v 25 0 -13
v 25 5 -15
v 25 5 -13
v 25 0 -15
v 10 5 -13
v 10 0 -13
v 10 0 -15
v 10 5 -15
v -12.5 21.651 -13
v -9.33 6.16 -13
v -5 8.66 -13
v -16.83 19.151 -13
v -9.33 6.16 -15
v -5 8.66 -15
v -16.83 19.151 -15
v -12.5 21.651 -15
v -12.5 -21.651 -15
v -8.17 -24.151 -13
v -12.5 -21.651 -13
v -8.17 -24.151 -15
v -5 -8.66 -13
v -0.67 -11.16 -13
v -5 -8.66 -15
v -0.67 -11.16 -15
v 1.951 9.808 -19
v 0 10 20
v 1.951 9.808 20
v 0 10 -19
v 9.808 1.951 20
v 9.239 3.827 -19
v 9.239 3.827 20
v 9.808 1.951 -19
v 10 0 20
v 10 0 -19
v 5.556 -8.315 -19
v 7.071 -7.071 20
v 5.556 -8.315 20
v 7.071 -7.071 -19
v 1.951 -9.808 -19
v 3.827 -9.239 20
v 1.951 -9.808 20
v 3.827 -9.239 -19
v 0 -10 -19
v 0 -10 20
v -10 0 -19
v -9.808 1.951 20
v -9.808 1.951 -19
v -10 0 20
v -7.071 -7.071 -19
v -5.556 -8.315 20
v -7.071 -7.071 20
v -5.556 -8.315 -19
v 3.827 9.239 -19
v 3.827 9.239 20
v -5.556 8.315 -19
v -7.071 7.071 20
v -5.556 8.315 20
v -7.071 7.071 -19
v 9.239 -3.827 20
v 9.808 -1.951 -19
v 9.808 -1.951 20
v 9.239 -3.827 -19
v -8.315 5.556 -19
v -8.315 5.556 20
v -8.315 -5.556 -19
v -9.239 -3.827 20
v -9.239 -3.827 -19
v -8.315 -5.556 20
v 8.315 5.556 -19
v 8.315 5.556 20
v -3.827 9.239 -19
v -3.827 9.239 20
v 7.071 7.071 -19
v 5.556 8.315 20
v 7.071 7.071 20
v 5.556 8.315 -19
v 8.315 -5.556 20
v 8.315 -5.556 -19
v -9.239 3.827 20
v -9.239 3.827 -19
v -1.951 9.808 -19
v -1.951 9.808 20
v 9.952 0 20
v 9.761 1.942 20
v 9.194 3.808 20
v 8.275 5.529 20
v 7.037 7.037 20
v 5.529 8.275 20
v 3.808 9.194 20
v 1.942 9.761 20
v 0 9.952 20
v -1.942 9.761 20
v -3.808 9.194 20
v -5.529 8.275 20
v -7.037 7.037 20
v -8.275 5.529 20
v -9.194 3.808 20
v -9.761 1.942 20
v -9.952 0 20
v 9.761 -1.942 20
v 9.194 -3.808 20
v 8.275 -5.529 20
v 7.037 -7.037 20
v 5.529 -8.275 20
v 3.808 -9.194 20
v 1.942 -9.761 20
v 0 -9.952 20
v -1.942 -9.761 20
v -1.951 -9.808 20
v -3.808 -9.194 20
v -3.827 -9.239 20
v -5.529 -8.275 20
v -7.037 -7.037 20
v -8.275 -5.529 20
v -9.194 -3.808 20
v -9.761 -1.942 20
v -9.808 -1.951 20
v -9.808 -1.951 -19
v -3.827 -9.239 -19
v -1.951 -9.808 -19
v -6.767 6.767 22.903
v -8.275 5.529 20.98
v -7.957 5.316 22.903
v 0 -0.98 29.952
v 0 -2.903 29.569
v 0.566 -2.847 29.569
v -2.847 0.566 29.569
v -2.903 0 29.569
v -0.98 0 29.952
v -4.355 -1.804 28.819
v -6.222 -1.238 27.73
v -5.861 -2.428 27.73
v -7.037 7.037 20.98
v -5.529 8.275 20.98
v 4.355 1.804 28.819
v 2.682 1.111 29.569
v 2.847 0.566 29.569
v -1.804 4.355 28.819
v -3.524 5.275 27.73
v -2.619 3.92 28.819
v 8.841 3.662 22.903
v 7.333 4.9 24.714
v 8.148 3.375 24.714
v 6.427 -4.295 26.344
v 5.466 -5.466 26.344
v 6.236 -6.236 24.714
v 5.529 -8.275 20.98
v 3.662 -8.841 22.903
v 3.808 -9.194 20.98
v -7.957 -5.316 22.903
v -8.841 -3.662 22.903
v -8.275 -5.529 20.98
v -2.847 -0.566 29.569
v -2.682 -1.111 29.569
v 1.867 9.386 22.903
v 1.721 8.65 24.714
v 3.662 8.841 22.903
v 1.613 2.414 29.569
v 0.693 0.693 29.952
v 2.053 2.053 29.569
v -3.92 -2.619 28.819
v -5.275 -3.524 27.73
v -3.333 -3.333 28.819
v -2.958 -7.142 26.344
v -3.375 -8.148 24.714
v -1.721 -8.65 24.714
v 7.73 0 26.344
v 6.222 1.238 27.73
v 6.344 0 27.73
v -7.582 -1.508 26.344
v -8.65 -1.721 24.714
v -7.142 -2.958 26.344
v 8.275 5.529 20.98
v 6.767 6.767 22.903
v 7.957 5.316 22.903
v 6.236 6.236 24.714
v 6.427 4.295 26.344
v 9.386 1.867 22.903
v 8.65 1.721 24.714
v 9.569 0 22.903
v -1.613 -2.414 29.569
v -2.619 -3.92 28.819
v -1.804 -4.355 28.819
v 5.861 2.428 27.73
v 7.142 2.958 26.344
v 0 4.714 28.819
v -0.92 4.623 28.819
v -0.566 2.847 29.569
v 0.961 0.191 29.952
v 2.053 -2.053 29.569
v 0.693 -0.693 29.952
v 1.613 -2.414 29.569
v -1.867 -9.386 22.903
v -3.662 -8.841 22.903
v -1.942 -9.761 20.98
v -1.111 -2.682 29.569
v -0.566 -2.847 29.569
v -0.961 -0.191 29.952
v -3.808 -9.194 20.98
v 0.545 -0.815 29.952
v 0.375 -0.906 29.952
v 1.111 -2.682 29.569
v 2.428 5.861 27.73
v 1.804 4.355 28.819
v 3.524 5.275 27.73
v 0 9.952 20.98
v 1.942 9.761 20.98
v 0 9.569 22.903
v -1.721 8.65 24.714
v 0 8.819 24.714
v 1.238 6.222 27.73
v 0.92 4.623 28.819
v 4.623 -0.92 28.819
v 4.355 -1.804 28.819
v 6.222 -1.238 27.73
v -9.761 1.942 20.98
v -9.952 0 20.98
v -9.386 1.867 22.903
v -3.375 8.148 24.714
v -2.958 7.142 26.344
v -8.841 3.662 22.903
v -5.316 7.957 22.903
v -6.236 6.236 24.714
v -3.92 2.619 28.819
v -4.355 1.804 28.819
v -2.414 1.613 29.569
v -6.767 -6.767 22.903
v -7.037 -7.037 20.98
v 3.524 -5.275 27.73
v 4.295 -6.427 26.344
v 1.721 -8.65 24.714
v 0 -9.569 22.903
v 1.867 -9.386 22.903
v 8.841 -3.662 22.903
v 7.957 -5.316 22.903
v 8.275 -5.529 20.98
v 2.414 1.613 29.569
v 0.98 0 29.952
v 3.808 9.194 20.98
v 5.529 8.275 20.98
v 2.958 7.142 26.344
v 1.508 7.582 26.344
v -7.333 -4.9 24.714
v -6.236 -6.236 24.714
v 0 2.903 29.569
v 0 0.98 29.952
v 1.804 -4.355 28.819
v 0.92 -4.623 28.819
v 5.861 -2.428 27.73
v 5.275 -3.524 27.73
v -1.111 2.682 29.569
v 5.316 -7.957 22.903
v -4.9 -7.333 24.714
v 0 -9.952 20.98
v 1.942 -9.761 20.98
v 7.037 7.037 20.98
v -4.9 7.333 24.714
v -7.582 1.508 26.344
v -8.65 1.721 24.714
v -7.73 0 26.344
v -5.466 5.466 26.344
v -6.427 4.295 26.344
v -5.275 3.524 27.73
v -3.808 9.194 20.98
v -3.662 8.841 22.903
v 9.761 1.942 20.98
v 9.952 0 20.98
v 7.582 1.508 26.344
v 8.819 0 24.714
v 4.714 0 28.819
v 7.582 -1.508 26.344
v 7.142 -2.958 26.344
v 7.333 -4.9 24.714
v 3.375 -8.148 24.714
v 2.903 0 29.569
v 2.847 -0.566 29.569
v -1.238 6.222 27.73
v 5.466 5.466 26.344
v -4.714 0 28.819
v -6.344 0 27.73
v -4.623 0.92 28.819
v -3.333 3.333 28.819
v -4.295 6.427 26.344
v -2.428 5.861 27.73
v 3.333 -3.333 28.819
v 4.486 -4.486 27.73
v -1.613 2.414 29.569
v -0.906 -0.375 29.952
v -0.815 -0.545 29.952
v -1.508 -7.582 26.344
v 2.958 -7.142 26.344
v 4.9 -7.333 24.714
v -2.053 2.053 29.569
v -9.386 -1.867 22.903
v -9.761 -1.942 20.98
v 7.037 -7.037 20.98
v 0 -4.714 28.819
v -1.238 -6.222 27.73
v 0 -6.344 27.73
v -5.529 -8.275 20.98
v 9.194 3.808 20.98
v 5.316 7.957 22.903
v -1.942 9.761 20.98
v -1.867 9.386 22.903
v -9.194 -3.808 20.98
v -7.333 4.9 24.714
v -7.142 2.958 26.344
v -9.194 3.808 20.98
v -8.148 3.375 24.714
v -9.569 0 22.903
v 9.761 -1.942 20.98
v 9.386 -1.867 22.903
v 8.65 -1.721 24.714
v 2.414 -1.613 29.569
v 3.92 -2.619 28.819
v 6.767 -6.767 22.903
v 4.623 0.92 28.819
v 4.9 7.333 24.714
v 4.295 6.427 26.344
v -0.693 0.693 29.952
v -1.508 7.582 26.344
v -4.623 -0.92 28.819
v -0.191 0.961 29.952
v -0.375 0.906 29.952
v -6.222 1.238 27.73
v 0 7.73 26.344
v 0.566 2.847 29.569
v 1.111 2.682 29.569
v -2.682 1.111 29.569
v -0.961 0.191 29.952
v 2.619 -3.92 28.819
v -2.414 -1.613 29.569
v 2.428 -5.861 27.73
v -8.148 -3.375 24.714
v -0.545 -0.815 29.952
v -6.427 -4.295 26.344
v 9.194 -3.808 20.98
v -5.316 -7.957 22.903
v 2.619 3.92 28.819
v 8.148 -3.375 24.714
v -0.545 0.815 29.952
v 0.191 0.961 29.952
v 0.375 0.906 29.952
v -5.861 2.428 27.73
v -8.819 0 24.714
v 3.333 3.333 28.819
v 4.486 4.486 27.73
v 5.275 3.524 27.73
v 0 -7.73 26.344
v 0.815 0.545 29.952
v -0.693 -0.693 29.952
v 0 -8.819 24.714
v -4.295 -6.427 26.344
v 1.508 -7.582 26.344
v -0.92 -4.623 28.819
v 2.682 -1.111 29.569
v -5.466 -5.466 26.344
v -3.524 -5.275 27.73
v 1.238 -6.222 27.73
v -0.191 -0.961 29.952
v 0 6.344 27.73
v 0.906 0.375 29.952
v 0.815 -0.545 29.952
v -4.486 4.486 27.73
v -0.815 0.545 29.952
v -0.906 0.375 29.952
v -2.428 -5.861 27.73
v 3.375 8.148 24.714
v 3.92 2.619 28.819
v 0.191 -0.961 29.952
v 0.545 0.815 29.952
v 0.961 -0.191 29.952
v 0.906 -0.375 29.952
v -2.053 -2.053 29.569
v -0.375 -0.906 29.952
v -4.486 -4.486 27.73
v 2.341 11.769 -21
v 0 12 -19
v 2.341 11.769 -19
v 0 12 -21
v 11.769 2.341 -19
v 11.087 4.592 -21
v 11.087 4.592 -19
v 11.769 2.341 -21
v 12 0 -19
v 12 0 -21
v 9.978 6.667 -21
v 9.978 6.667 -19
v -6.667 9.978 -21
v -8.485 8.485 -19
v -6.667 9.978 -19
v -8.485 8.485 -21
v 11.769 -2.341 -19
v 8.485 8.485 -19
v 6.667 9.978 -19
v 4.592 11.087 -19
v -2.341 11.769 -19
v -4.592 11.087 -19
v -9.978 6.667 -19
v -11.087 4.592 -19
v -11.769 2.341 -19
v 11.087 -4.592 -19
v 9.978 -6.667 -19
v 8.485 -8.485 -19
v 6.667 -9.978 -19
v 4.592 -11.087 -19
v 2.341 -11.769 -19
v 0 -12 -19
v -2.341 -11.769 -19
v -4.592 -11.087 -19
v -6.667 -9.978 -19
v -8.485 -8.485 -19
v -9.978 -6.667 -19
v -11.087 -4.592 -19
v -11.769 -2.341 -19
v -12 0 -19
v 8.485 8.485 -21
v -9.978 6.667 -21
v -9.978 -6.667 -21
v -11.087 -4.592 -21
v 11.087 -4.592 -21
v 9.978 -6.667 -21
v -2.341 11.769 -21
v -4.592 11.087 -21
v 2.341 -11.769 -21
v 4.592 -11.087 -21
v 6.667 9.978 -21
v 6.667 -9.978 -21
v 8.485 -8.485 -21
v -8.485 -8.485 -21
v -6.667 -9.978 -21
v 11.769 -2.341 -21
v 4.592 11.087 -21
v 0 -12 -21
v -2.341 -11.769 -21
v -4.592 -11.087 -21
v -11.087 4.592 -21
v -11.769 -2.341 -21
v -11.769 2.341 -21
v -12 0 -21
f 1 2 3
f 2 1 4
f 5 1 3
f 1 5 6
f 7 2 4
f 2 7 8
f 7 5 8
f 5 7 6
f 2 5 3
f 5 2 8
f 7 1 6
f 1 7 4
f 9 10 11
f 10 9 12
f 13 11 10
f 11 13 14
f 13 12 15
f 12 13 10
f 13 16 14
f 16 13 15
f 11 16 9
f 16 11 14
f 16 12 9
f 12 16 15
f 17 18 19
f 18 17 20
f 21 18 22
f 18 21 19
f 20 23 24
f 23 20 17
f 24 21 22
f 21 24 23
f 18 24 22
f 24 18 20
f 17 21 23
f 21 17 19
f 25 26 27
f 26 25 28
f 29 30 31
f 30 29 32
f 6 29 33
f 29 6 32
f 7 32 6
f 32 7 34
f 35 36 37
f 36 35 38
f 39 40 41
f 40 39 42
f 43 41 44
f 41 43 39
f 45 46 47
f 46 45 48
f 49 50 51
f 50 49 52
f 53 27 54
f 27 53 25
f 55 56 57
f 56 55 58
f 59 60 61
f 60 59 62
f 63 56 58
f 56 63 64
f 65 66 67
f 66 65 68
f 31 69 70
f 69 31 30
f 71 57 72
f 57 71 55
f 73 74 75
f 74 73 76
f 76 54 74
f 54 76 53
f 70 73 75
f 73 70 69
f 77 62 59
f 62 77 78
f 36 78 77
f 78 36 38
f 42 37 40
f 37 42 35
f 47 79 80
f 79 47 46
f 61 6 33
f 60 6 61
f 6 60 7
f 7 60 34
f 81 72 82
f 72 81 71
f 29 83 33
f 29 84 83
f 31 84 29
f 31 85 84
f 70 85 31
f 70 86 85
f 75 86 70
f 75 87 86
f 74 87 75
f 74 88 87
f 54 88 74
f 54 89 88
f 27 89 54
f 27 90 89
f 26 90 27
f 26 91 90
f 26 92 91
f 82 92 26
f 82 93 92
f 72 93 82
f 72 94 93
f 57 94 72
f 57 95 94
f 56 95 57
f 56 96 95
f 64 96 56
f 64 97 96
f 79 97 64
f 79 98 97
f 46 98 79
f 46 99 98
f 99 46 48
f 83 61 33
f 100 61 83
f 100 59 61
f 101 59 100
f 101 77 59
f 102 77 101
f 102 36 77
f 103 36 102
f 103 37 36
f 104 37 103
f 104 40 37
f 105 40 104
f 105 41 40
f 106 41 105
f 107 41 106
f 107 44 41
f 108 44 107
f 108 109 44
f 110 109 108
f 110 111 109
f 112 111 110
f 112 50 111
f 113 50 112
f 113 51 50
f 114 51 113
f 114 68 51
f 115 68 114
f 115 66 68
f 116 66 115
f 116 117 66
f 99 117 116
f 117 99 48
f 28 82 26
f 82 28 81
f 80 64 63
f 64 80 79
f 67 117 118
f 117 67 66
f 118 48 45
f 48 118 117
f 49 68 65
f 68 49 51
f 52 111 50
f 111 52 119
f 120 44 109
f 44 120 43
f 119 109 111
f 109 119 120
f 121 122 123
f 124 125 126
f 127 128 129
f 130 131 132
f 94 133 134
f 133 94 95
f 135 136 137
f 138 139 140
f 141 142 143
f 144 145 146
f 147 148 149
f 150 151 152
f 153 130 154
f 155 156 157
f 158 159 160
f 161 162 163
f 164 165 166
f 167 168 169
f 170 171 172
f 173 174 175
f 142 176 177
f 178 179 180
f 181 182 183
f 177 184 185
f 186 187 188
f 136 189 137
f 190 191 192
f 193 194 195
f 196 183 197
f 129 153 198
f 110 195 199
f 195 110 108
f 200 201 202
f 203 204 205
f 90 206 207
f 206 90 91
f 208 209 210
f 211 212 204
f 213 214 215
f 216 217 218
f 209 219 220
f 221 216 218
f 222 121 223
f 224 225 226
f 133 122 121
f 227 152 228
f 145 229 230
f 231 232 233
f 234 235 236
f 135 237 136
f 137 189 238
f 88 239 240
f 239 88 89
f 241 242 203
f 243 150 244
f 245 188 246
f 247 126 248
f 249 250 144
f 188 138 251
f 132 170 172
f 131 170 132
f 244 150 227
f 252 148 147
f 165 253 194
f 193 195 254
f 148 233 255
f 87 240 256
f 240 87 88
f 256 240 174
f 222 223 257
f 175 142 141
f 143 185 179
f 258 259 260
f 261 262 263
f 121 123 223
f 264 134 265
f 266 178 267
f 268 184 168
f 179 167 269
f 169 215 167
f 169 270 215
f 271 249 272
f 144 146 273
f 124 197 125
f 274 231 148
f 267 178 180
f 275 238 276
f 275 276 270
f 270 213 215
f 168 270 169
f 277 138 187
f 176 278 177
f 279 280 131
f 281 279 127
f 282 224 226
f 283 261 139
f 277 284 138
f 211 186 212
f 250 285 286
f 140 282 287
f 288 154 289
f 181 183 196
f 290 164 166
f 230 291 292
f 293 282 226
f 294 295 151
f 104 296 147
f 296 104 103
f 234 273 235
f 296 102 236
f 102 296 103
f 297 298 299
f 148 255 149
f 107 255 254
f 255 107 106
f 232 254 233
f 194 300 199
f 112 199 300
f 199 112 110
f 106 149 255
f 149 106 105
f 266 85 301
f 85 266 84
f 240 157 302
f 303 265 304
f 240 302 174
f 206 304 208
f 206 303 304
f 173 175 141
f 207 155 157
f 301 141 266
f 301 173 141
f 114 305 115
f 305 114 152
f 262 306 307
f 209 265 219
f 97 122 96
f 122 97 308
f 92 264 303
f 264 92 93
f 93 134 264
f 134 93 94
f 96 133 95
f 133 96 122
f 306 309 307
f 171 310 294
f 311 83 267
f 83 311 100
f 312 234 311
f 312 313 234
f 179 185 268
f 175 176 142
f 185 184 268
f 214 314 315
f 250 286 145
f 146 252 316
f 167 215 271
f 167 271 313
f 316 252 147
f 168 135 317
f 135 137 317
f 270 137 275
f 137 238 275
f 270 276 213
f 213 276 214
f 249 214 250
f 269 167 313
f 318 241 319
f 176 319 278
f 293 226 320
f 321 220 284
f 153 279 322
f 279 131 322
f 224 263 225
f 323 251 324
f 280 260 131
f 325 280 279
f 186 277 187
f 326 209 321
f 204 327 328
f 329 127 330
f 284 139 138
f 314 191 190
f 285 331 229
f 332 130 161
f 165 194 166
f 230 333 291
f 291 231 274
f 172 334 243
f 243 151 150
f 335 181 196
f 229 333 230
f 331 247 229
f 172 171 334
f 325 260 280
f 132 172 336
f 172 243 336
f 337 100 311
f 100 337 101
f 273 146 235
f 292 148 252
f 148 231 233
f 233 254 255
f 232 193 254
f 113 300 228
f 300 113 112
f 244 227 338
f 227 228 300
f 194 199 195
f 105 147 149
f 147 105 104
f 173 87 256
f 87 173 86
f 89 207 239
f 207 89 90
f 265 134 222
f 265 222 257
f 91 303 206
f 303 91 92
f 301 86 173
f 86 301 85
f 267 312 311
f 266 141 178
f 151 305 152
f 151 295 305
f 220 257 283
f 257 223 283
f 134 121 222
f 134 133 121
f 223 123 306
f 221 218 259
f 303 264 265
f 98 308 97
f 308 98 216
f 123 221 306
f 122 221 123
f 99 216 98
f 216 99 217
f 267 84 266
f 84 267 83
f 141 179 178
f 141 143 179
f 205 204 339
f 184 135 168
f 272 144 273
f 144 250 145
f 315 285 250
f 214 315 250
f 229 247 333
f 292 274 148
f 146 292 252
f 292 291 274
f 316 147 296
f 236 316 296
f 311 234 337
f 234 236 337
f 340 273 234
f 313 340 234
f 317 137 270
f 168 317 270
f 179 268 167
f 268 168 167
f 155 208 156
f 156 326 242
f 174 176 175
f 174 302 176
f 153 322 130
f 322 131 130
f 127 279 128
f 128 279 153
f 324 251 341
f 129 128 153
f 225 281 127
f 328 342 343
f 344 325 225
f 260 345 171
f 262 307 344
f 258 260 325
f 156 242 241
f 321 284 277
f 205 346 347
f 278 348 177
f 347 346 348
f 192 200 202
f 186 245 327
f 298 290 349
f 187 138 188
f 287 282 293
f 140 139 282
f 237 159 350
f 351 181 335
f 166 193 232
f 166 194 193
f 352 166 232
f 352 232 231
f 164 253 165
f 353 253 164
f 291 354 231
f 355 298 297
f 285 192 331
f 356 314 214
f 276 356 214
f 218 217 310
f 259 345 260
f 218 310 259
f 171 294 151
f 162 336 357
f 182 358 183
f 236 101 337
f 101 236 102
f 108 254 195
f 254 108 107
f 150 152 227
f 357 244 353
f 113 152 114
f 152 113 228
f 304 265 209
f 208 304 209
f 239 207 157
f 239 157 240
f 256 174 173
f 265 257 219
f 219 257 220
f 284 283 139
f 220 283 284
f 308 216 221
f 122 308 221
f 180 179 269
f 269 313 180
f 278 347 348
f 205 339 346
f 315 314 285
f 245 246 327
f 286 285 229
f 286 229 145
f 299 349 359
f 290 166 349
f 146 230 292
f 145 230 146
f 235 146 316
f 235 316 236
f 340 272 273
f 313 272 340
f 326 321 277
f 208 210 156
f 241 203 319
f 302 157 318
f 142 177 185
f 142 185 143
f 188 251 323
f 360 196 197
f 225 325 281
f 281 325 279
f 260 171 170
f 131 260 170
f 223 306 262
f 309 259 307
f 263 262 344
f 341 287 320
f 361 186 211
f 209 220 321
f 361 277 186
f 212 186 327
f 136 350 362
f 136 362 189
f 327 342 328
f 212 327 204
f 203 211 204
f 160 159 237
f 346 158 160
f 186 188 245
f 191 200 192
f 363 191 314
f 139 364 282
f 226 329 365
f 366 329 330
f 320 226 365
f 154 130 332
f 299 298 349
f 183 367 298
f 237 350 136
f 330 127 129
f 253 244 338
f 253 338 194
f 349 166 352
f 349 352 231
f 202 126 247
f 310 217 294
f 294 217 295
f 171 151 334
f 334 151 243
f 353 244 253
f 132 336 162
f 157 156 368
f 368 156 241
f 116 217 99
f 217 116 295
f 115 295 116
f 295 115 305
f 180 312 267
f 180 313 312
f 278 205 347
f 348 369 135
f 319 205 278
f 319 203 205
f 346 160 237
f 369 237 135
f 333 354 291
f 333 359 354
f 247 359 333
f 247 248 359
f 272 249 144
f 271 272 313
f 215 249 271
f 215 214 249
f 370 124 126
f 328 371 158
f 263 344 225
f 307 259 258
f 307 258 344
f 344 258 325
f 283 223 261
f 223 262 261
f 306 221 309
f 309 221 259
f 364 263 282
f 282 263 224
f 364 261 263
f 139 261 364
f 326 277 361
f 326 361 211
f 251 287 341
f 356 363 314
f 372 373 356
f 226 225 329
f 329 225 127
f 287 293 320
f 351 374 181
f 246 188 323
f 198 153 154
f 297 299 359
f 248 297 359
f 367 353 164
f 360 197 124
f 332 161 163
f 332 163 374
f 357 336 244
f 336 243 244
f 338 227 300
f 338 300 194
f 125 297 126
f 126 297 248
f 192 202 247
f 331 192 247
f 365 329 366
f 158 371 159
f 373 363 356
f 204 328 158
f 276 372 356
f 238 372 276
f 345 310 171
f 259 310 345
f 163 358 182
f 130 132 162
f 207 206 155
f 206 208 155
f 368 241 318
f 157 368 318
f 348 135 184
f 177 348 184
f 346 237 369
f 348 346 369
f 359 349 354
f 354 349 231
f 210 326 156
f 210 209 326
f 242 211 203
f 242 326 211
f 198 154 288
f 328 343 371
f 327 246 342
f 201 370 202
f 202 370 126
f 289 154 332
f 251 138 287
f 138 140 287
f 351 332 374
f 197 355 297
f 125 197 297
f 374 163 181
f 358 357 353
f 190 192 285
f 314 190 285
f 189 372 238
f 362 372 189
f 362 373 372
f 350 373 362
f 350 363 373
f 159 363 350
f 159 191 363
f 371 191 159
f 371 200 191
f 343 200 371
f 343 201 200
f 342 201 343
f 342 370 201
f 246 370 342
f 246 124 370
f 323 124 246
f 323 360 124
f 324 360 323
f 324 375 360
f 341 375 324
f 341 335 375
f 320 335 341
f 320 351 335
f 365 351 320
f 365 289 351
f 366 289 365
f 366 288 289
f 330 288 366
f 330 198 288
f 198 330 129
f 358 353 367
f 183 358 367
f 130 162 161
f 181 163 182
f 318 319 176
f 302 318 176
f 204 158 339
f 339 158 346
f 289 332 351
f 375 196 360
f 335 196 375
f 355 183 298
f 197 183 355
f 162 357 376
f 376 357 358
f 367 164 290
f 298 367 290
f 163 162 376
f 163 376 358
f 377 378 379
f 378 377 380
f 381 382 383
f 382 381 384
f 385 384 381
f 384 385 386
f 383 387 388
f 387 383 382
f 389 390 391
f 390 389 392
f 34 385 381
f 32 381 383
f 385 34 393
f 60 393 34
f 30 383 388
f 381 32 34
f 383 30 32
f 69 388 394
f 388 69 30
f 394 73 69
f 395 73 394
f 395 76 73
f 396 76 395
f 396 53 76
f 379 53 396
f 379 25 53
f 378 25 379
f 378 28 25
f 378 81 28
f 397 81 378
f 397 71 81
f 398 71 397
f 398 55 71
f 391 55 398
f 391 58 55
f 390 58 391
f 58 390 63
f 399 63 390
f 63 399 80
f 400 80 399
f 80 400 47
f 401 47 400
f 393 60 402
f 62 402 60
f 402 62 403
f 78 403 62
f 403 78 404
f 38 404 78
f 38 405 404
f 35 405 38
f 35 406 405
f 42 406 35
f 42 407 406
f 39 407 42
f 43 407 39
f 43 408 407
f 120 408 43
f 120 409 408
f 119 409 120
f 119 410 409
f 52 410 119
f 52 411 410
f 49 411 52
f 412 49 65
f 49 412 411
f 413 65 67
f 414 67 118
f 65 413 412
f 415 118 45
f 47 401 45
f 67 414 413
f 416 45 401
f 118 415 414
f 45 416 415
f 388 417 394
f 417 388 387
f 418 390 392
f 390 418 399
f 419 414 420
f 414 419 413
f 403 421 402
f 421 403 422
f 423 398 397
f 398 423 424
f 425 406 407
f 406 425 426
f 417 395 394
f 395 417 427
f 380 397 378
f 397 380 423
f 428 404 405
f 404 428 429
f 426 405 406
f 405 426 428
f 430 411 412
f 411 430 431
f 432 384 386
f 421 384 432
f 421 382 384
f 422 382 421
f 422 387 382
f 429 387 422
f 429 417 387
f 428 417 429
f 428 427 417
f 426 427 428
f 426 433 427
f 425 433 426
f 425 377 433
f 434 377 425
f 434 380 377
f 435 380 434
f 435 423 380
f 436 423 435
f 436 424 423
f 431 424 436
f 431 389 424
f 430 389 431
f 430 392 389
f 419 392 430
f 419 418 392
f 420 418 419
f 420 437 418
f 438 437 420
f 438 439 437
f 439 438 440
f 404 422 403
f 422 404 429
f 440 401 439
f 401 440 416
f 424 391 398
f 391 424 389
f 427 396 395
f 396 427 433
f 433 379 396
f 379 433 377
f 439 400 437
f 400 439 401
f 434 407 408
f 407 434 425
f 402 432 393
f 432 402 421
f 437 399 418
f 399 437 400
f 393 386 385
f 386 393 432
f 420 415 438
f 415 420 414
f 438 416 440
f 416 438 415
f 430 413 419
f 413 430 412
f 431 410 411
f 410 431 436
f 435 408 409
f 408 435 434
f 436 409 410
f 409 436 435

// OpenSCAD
// Retro Rocket Design
$fn = 32;

module rocket() {
    // Main Body
    cylinder(h = 40, r = 10, center = true);
    
    // Nose Cone
    translate([0, 0, 20])
    sphere(r = 10);
    
    // Fins
    for (r = [0, 120, 240]) {
        rotate([0, 0, r])
        translate([10, 0, -15])
        cube([15, 5, 2]);
    }
    
    // Window
    rotate([0, 90, 0])
    cylinder(h = 2, r = 3, center = true);
}

// Combine components
union() {
    rocket();
    // Add a small base ring for stability
    translate([0,0,-20])
    cylinder(h = 2, r = 12, center = true);
}
